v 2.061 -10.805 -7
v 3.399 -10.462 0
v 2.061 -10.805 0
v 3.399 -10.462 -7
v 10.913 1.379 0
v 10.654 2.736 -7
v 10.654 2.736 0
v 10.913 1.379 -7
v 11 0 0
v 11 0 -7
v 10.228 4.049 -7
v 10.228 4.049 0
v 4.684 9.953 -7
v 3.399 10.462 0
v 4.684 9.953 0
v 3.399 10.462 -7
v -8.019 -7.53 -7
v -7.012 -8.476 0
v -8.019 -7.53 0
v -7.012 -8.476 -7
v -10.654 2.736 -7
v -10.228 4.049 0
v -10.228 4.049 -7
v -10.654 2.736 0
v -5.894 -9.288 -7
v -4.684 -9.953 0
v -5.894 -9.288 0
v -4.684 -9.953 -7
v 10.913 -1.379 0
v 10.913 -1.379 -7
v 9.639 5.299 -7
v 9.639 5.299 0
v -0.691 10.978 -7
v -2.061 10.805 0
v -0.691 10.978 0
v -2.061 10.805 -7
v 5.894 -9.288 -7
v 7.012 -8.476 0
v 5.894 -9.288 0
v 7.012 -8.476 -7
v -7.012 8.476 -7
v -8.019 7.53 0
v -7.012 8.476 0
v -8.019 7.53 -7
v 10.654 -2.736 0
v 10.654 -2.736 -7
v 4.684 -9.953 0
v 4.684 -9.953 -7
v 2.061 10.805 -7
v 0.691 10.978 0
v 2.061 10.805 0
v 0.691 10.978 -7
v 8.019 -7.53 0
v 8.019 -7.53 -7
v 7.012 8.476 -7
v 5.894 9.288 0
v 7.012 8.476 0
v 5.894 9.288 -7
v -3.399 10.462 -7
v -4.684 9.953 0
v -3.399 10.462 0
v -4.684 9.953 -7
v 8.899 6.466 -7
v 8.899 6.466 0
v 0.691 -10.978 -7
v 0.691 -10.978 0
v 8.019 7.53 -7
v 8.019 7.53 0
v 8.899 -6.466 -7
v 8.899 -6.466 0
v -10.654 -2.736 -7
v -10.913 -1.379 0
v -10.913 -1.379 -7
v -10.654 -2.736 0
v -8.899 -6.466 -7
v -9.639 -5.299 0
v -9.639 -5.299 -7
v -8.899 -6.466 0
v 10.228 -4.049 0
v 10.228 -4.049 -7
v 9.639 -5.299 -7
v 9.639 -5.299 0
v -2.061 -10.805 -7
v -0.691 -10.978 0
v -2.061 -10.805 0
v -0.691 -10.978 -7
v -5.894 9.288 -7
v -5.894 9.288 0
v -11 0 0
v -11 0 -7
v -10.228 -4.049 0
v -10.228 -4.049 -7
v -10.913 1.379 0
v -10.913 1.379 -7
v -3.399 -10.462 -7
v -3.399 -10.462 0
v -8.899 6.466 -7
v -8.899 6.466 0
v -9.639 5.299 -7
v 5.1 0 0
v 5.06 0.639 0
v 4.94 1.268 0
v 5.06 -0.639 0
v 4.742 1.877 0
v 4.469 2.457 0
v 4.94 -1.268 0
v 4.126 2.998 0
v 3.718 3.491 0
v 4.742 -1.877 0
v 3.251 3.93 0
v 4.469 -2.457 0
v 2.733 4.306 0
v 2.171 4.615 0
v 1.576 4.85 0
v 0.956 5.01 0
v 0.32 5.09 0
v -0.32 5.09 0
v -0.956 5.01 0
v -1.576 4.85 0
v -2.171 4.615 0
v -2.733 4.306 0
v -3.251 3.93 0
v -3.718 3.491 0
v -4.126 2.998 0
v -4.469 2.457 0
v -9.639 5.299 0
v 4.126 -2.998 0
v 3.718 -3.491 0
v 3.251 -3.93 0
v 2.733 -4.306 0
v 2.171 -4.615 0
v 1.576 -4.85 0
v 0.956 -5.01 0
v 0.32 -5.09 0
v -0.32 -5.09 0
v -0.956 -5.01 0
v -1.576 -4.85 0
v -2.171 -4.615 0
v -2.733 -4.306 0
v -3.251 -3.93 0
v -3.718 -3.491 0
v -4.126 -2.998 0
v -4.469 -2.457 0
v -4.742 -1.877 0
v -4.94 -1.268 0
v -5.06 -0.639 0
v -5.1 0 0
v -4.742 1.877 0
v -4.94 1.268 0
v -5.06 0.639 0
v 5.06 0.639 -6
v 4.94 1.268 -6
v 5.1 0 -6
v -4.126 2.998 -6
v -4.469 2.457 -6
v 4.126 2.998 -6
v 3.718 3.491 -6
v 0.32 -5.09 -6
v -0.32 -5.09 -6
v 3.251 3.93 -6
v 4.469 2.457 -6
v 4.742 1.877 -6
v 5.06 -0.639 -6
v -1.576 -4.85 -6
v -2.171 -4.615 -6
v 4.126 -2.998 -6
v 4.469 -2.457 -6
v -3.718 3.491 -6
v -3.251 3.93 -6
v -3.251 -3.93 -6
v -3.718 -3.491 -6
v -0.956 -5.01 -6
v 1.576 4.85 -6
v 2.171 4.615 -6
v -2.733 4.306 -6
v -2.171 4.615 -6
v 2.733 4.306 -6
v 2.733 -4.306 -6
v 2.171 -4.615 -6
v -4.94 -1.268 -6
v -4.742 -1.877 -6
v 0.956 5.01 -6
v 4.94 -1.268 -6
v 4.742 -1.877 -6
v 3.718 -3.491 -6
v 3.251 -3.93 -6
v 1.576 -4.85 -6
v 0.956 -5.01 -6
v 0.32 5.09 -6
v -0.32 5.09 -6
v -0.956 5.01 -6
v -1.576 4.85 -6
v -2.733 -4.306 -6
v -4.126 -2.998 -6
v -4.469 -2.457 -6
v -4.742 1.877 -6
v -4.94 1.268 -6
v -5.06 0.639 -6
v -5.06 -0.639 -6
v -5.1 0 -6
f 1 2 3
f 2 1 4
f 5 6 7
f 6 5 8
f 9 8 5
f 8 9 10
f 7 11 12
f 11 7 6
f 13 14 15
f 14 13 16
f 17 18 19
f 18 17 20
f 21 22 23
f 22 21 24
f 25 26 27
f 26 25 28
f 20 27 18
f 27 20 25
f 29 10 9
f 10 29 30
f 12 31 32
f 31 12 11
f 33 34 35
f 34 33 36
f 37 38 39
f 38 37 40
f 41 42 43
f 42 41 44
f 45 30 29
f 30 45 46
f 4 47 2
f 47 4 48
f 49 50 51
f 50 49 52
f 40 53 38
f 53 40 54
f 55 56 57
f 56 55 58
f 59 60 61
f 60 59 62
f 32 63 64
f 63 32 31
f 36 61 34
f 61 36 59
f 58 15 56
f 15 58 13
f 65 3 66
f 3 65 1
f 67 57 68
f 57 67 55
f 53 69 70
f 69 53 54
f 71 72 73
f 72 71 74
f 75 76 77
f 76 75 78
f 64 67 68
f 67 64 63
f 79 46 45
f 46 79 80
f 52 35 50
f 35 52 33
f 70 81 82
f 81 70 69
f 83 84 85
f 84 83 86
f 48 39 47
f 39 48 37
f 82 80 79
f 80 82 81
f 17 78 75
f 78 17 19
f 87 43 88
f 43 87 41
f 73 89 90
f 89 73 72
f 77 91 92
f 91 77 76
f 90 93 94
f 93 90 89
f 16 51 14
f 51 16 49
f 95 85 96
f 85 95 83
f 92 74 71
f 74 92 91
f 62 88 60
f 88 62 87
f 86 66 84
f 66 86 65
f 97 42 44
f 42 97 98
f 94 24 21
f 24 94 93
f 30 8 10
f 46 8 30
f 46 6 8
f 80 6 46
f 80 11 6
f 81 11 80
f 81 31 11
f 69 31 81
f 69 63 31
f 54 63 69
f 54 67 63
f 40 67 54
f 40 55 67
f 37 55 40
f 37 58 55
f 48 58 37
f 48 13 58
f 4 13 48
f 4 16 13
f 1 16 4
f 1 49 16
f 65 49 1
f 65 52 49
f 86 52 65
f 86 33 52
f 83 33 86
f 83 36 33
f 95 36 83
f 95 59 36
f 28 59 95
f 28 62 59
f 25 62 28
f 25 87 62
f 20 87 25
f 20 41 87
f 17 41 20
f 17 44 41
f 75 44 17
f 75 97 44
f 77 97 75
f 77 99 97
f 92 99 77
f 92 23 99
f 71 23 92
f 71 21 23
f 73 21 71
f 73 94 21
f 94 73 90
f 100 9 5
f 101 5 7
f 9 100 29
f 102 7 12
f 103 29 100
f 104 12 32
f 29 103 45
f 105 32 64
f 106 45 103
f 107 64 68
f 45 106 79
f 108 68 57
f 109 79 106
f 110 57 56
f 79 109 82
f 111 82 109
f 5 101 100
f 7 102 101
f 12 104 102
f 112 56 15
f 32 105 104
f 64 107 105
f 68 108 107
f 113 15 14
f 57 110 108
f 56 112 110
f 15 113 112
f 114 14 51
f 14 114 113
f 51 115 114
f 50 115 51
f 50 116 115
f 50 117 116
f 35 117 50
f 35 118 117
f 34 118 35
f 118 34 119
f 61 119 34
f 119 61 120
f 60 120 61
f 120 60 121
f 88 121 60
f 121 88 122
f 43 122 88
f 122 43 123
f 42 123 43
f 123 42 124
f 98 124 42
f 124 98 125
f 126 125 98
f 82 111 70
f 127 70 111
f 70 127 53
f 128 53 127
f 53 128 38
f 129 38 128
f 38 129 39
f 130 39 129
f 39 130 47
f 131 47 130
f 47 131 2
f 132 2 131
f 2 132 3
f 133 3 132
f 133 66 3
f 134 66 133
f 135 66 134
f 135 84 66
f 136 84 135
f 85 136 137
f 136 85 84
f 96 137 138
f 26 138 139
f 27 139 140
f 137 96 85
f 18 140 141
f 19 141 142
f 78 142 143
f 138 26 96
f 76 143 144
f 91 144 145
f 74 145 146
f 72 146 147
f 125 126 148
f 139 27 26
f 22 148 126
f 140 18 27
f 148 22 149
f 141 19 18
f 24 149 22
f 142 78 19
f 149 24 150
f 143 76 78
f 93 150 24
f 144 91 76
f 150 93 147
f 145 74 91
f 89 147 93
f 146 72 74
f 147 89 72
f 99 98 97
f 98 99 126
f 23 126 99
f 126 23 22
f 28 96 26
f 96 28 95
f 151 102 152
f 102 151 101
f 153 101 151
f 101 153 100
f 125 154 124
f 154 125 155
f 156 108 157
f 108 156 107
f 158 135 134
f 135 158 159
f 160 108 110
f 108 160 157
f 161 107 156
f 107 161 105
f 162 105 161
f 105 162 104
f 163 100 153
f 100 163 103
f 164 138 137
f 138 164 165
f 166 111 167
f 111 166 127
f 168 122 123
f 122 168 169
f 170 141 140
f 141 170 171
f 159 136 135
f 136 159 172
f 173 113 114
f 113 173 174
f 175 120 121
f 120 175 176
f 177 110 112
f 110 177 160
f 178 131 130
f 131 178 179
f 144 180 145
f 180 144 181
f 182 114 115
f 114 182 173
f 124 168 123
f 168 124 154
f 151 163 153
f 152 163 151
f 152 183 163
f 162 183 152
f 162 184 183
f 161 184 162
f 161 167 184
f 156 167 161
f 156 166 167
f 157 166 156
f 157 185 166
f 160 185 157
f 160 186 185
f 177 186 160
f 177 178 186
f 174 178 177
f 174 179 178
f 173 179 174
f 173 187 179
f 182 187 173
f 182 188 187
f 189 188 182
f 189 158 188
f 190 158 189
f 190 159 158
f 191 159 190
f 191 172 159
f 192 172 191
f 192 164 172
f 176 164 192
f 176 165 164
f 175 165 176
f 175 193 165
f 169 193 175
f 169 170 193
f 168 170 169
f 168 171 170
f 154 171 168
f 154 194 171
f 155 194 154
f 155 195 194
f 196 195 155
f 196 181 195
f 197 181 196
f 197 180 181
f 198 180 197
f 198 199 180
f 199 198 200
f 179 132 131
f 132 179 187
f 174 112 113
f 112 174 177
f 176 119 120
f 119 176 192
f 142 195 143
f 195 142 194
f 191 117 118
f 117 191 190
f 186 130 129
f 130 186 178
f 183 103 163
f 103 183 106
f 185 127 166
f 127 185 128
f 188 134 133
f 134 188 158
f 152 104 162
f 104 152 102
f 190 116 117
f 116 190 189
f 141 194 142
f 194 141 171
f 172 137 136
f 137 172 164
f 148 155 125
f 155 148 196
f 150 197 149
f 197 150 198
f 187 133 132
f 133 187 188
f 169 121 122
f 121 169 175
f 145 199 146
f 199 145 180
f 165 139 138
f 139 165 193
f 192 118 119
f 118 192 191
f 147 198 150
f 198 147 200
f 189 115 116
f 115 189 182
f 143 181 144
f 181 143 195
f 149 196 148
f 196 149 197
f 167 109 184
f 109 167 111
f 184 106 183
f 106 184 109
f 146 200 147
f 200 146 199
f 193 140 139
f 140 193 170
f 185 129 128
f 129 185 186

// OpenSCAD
$fn = 50;


difference() {
	union() {
		translate(v = [0, 0, -7.0000000000]) {
			cylinder(h = 7, r = 11.0000000000);
		}
	}
	union() {
		#translate(v = [0, 0, -6.0000000000]) {
			cylinder(h = 6, r = 5.1000000000);
		}
	}
}
